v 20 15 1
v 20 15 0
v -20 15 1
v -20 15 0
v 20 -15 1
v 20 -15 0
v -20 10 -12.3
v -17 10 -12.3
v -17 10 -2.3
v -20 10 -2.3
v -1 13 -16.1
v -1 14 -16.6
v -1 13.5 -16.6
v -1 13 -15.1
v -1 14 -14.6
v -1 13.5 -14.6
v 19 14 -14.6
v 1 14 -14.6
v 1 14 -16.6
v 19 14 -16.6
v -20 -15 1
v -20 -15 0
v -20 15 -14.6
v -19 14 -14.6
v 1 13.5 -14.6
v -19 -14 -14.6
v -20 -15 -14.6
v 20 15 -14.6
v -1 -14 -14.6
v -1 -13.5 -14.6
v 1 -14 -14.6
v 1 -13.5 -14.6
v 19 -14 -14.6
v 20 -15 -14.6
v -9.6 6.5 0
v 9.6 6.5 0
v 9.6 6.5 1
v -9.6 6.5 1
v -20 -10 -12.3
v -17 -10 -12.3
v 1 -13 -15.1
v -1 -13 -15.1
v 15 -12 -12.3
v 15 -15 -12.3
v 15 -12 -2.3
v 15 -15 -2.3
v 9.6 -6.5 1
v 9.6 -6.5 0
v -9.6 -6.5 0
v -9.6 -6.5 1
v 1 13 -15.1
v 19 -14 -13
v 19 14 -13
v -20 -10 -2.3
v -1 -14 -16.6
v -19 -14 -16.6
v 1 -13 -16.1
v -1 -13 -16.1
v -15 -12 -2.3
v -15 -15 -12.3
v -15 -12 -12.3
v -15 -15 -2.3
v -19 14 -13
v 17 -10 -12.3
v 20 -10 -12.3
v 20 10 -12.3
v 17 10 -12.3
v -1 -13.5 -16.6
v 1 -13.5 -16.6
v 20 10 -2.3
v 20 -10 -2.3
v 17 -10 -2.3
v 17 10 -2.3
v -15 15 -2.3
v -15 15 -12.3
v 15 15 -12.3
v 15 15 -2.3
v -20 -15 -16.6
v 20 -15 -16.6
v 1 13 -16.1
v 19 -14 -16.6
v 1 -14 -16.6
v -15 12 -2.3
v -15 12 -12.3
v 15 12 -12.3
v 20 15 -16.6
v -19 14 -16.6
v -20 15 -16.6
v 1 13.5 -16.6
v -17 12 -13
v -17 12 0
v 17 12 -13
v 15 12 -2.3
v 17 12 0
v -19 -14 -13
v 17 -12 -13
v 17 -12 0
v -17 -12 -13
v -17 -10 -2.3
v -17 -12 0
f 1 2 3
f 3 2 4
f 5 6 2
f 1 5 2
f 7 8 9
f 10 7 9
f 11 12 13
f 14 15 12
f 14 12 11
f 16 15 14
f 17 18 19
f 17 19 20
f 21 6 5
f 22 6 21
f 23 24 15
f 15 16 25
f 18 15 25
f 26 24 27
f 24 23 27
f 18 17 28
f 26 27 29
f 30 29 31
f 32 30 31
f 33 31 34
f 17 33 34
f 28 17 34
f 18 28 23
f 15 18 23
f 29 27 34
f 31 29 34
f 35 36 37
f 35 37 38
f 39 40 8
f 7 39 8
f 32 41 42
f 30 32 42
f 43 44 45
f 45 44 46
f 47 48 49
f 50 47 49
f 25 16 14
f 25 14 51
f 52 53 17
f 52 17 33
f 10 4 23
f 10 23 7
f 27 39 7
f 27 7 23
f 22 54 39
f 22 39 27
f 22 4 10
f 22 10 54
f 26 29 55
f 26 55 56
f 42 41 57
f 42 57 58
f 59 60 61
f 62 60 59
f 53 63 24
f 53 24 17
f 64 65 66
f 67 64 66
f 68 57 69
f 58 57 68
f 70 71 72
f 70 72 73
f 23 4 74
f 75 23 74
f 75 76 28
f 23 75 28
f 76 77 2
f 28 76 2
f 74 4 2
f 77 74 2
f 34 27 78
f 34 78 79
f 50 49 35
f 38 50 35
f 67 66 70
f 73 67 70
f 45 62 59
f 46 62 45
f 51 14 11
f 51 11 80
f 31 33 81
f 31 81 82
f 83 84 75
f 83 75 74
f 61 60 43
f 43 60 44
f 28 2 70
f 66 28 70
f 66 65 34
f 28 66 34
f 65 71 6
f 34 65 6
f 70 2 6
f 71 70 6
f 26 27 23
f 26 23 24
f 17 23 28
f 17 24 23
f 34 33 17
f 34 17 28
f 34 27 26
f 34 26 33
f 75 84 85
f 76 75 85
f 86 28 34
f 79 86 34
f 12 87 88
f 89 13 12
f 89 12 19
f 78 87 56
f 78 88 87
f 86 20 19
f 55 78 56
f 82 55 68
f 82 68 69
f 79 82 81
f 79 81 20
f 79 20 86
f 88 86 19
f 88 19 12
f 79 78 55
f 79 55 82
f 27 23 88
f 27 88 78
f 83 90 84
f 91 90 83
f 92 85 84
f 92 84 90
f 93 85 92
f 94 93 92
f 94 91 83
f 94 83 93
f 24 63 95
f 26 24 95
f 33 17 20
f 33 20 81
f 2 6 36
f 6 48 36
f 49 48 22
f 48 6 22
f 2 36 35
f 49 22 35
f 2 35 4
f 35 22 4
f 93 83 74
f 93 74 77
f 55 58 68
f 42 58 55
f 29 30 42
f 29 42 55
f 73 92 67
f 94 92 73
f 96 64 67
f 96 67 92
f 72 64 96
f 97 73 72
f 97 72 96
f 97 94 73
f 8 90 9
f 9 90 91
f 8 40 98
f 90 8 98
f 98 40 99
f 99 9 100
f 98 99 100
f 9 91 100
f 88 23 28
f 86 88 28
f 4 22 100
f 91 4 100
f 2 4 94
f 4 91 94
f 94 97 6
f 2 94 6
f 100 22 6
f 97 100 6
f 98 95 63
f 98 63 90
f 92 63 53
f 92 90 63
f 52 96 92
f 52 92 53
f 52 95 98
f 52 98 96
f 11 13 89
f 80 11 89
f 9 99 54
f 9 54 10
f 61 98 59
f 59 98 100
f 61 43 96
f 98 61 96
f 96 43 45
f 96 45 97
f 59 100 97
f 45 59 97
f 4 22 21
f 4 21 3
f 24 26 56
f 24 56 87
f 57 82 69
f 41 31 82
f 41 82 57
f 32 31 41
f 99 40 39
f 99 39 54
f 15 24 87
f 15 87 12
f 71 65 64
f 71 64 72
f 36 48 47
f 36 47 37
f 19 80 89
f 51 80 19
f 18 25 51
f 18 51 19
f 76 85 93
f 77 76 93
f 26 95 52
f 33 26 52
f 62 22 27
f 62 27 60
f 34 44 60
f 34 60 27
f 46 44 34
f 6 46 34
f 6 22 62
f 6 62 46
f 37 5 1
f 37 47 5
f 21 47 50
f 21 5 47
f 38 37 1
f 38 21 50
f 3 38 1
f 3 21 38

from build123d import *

# Parameters (mm, degrees)
SKETCH1_W           = 30
SKETCH1_H           = 40
SKETCH1_W_2         = 13
SKETCH1_H_2         = 19.2
BOSS_EXTRUDE1_DEPTH = 1
SKETCH2_W           = 40
SKETCH2_H           = 30
SKETCH2_W_2         = 34
SKETCH2_H_2         = 24
BOSS_EXTRUDE2_DEPTH = 13
SKETCH3_W           = 40
SKETCH3_H           = 30
SKETCH3_W_2         = 38
SKETCH3_H_2         = 28
BOSS_EXTRUDE3_DEPTH = 1.6
SKETCH4_W           = 40
SKETCH4_H           = 30
BOSS_EXTRUDE4_DEPTH = 2
CHAMFER1_SIZE       = 0.5
CHAMFER2_SIZE       = 0.5
SKETCH5_W           = 30
SKETCH5_H           = 10
CUT_EXTRUDE1_DEPTH  = 70
SKETCH6_W           = 20
SKETCH6_H           = 10
CUT_EXTRUDE2_DEPTH  = 70


with BuildPart() as part:
    # Sketch1 → Boss-Extrude1 (new body)
    with BuildSketch(Plane(origin=(0, 0, 0), x_dir=(0, 1, 0), z_dir=(0, 0, 1))):
        Rectangle(SKETCH1_W, SKETCH1_H)
        Rectangle(SKETCH1_W_2, SKETCH1_H_2, mode=Mode.SUBTRACT)
    extrude(amount=BOSS_EXTRUDE1_DEPTH)


with BuildPart() as body_2:
    # Sketch2 → Boss-Extrude2 (new body)
    with BuildSketch(Plane(origin=(0, 0, 0), x_dir=(1, 0, 0), z_dir=(0, 0, -1))):
        Rectangle(SKETCH2_W, SKETCH2_H)
        Rectangle(SKETCH2_W_2, SKETCH2_H_2, mode=Mode.SUBTRACT)
    extrude(amount=BOSS_EXTRUDE2_DEPTH)

    # Sketch3 → Boss-Extrude3 (add)
    with BuildSketch(Plane(origin=(0, 0, -13), x_dir=(1, 0, 0), z_dir=(0, 0, -1))):
        Rectangle(SKETCH3_W, SKETCH3_H)
        Rectangle(SKETCH3_W_2, SKETCH3_H_2, mode=Mode.SUBTRACT)
    extrude(amount=BOSS_EXTRUDE3_DEPTH)

    # Sketch5 → Cut-Extrude1 (cut)
    with BuildSketch(Plane.XZ.offset(15)):
        with Locations((0, -7.3)):
            Rectangle(SKETCH5_W, SKETCH5_H)
    extrude(amount=-CUT_EXTRUDE1_DEPTH, mode=Mode.SUBTRACT)

    # Sketch6 → Cut-Extrude2 (cut)
    with BuildSketch(Plane.YZ.offset(20)):
        with Locations((0, -7.3)):
            Rectangle(SKETCH6_W, SKETCH6_H)
    extrude(amount=-CUT_EXTRUDE2_DEPTH, mode=Mode.SUBTRACT)


with BuildPart() as body_3:
    # Sketch4 → Boss-Extrude4 (new body)
    with BuildSketch(Plane(origin=(0, 0, -14.6), x_dir=(1, 0, 0), z_dir=(0, 0, -1))):
        Rectangle(SKETCH4_W, SKETCH4_H)
        Polygon((19, -14), (19, 14), (1, 14), (1, 13), (-1, 13), (-1, 14), (-19, 14), (-19, -14), (-1, -14), (-1, -13), (1, -13), (1, -14), align=None, mode=Mode.SUBTRACT)
    extrude(amount=BOSS_EXTRUDE4_DEPTH)

    # Chamfer1
    chamfer1_edges = [body_3.edges().sort_by_distance(p)[0] for p in [
        (0, 13, -14.6),
        (0, 13, -16.6),
    ]]
    chamfer(chamfer1_edges, length=CHAMFER1_SIZE)

    # Chamfer2
    chamfer2_edges = [body_3.edges().sort_by_distance(p)[0] for p in [
        (0, -13, -14.6),
        (0, -13, -16.6),
    ]]
    chamfer(chamfer2_edges, length=CHAMFER2_SIZE)


solid = Compound([part.part, body_2.part, body_3.part])
